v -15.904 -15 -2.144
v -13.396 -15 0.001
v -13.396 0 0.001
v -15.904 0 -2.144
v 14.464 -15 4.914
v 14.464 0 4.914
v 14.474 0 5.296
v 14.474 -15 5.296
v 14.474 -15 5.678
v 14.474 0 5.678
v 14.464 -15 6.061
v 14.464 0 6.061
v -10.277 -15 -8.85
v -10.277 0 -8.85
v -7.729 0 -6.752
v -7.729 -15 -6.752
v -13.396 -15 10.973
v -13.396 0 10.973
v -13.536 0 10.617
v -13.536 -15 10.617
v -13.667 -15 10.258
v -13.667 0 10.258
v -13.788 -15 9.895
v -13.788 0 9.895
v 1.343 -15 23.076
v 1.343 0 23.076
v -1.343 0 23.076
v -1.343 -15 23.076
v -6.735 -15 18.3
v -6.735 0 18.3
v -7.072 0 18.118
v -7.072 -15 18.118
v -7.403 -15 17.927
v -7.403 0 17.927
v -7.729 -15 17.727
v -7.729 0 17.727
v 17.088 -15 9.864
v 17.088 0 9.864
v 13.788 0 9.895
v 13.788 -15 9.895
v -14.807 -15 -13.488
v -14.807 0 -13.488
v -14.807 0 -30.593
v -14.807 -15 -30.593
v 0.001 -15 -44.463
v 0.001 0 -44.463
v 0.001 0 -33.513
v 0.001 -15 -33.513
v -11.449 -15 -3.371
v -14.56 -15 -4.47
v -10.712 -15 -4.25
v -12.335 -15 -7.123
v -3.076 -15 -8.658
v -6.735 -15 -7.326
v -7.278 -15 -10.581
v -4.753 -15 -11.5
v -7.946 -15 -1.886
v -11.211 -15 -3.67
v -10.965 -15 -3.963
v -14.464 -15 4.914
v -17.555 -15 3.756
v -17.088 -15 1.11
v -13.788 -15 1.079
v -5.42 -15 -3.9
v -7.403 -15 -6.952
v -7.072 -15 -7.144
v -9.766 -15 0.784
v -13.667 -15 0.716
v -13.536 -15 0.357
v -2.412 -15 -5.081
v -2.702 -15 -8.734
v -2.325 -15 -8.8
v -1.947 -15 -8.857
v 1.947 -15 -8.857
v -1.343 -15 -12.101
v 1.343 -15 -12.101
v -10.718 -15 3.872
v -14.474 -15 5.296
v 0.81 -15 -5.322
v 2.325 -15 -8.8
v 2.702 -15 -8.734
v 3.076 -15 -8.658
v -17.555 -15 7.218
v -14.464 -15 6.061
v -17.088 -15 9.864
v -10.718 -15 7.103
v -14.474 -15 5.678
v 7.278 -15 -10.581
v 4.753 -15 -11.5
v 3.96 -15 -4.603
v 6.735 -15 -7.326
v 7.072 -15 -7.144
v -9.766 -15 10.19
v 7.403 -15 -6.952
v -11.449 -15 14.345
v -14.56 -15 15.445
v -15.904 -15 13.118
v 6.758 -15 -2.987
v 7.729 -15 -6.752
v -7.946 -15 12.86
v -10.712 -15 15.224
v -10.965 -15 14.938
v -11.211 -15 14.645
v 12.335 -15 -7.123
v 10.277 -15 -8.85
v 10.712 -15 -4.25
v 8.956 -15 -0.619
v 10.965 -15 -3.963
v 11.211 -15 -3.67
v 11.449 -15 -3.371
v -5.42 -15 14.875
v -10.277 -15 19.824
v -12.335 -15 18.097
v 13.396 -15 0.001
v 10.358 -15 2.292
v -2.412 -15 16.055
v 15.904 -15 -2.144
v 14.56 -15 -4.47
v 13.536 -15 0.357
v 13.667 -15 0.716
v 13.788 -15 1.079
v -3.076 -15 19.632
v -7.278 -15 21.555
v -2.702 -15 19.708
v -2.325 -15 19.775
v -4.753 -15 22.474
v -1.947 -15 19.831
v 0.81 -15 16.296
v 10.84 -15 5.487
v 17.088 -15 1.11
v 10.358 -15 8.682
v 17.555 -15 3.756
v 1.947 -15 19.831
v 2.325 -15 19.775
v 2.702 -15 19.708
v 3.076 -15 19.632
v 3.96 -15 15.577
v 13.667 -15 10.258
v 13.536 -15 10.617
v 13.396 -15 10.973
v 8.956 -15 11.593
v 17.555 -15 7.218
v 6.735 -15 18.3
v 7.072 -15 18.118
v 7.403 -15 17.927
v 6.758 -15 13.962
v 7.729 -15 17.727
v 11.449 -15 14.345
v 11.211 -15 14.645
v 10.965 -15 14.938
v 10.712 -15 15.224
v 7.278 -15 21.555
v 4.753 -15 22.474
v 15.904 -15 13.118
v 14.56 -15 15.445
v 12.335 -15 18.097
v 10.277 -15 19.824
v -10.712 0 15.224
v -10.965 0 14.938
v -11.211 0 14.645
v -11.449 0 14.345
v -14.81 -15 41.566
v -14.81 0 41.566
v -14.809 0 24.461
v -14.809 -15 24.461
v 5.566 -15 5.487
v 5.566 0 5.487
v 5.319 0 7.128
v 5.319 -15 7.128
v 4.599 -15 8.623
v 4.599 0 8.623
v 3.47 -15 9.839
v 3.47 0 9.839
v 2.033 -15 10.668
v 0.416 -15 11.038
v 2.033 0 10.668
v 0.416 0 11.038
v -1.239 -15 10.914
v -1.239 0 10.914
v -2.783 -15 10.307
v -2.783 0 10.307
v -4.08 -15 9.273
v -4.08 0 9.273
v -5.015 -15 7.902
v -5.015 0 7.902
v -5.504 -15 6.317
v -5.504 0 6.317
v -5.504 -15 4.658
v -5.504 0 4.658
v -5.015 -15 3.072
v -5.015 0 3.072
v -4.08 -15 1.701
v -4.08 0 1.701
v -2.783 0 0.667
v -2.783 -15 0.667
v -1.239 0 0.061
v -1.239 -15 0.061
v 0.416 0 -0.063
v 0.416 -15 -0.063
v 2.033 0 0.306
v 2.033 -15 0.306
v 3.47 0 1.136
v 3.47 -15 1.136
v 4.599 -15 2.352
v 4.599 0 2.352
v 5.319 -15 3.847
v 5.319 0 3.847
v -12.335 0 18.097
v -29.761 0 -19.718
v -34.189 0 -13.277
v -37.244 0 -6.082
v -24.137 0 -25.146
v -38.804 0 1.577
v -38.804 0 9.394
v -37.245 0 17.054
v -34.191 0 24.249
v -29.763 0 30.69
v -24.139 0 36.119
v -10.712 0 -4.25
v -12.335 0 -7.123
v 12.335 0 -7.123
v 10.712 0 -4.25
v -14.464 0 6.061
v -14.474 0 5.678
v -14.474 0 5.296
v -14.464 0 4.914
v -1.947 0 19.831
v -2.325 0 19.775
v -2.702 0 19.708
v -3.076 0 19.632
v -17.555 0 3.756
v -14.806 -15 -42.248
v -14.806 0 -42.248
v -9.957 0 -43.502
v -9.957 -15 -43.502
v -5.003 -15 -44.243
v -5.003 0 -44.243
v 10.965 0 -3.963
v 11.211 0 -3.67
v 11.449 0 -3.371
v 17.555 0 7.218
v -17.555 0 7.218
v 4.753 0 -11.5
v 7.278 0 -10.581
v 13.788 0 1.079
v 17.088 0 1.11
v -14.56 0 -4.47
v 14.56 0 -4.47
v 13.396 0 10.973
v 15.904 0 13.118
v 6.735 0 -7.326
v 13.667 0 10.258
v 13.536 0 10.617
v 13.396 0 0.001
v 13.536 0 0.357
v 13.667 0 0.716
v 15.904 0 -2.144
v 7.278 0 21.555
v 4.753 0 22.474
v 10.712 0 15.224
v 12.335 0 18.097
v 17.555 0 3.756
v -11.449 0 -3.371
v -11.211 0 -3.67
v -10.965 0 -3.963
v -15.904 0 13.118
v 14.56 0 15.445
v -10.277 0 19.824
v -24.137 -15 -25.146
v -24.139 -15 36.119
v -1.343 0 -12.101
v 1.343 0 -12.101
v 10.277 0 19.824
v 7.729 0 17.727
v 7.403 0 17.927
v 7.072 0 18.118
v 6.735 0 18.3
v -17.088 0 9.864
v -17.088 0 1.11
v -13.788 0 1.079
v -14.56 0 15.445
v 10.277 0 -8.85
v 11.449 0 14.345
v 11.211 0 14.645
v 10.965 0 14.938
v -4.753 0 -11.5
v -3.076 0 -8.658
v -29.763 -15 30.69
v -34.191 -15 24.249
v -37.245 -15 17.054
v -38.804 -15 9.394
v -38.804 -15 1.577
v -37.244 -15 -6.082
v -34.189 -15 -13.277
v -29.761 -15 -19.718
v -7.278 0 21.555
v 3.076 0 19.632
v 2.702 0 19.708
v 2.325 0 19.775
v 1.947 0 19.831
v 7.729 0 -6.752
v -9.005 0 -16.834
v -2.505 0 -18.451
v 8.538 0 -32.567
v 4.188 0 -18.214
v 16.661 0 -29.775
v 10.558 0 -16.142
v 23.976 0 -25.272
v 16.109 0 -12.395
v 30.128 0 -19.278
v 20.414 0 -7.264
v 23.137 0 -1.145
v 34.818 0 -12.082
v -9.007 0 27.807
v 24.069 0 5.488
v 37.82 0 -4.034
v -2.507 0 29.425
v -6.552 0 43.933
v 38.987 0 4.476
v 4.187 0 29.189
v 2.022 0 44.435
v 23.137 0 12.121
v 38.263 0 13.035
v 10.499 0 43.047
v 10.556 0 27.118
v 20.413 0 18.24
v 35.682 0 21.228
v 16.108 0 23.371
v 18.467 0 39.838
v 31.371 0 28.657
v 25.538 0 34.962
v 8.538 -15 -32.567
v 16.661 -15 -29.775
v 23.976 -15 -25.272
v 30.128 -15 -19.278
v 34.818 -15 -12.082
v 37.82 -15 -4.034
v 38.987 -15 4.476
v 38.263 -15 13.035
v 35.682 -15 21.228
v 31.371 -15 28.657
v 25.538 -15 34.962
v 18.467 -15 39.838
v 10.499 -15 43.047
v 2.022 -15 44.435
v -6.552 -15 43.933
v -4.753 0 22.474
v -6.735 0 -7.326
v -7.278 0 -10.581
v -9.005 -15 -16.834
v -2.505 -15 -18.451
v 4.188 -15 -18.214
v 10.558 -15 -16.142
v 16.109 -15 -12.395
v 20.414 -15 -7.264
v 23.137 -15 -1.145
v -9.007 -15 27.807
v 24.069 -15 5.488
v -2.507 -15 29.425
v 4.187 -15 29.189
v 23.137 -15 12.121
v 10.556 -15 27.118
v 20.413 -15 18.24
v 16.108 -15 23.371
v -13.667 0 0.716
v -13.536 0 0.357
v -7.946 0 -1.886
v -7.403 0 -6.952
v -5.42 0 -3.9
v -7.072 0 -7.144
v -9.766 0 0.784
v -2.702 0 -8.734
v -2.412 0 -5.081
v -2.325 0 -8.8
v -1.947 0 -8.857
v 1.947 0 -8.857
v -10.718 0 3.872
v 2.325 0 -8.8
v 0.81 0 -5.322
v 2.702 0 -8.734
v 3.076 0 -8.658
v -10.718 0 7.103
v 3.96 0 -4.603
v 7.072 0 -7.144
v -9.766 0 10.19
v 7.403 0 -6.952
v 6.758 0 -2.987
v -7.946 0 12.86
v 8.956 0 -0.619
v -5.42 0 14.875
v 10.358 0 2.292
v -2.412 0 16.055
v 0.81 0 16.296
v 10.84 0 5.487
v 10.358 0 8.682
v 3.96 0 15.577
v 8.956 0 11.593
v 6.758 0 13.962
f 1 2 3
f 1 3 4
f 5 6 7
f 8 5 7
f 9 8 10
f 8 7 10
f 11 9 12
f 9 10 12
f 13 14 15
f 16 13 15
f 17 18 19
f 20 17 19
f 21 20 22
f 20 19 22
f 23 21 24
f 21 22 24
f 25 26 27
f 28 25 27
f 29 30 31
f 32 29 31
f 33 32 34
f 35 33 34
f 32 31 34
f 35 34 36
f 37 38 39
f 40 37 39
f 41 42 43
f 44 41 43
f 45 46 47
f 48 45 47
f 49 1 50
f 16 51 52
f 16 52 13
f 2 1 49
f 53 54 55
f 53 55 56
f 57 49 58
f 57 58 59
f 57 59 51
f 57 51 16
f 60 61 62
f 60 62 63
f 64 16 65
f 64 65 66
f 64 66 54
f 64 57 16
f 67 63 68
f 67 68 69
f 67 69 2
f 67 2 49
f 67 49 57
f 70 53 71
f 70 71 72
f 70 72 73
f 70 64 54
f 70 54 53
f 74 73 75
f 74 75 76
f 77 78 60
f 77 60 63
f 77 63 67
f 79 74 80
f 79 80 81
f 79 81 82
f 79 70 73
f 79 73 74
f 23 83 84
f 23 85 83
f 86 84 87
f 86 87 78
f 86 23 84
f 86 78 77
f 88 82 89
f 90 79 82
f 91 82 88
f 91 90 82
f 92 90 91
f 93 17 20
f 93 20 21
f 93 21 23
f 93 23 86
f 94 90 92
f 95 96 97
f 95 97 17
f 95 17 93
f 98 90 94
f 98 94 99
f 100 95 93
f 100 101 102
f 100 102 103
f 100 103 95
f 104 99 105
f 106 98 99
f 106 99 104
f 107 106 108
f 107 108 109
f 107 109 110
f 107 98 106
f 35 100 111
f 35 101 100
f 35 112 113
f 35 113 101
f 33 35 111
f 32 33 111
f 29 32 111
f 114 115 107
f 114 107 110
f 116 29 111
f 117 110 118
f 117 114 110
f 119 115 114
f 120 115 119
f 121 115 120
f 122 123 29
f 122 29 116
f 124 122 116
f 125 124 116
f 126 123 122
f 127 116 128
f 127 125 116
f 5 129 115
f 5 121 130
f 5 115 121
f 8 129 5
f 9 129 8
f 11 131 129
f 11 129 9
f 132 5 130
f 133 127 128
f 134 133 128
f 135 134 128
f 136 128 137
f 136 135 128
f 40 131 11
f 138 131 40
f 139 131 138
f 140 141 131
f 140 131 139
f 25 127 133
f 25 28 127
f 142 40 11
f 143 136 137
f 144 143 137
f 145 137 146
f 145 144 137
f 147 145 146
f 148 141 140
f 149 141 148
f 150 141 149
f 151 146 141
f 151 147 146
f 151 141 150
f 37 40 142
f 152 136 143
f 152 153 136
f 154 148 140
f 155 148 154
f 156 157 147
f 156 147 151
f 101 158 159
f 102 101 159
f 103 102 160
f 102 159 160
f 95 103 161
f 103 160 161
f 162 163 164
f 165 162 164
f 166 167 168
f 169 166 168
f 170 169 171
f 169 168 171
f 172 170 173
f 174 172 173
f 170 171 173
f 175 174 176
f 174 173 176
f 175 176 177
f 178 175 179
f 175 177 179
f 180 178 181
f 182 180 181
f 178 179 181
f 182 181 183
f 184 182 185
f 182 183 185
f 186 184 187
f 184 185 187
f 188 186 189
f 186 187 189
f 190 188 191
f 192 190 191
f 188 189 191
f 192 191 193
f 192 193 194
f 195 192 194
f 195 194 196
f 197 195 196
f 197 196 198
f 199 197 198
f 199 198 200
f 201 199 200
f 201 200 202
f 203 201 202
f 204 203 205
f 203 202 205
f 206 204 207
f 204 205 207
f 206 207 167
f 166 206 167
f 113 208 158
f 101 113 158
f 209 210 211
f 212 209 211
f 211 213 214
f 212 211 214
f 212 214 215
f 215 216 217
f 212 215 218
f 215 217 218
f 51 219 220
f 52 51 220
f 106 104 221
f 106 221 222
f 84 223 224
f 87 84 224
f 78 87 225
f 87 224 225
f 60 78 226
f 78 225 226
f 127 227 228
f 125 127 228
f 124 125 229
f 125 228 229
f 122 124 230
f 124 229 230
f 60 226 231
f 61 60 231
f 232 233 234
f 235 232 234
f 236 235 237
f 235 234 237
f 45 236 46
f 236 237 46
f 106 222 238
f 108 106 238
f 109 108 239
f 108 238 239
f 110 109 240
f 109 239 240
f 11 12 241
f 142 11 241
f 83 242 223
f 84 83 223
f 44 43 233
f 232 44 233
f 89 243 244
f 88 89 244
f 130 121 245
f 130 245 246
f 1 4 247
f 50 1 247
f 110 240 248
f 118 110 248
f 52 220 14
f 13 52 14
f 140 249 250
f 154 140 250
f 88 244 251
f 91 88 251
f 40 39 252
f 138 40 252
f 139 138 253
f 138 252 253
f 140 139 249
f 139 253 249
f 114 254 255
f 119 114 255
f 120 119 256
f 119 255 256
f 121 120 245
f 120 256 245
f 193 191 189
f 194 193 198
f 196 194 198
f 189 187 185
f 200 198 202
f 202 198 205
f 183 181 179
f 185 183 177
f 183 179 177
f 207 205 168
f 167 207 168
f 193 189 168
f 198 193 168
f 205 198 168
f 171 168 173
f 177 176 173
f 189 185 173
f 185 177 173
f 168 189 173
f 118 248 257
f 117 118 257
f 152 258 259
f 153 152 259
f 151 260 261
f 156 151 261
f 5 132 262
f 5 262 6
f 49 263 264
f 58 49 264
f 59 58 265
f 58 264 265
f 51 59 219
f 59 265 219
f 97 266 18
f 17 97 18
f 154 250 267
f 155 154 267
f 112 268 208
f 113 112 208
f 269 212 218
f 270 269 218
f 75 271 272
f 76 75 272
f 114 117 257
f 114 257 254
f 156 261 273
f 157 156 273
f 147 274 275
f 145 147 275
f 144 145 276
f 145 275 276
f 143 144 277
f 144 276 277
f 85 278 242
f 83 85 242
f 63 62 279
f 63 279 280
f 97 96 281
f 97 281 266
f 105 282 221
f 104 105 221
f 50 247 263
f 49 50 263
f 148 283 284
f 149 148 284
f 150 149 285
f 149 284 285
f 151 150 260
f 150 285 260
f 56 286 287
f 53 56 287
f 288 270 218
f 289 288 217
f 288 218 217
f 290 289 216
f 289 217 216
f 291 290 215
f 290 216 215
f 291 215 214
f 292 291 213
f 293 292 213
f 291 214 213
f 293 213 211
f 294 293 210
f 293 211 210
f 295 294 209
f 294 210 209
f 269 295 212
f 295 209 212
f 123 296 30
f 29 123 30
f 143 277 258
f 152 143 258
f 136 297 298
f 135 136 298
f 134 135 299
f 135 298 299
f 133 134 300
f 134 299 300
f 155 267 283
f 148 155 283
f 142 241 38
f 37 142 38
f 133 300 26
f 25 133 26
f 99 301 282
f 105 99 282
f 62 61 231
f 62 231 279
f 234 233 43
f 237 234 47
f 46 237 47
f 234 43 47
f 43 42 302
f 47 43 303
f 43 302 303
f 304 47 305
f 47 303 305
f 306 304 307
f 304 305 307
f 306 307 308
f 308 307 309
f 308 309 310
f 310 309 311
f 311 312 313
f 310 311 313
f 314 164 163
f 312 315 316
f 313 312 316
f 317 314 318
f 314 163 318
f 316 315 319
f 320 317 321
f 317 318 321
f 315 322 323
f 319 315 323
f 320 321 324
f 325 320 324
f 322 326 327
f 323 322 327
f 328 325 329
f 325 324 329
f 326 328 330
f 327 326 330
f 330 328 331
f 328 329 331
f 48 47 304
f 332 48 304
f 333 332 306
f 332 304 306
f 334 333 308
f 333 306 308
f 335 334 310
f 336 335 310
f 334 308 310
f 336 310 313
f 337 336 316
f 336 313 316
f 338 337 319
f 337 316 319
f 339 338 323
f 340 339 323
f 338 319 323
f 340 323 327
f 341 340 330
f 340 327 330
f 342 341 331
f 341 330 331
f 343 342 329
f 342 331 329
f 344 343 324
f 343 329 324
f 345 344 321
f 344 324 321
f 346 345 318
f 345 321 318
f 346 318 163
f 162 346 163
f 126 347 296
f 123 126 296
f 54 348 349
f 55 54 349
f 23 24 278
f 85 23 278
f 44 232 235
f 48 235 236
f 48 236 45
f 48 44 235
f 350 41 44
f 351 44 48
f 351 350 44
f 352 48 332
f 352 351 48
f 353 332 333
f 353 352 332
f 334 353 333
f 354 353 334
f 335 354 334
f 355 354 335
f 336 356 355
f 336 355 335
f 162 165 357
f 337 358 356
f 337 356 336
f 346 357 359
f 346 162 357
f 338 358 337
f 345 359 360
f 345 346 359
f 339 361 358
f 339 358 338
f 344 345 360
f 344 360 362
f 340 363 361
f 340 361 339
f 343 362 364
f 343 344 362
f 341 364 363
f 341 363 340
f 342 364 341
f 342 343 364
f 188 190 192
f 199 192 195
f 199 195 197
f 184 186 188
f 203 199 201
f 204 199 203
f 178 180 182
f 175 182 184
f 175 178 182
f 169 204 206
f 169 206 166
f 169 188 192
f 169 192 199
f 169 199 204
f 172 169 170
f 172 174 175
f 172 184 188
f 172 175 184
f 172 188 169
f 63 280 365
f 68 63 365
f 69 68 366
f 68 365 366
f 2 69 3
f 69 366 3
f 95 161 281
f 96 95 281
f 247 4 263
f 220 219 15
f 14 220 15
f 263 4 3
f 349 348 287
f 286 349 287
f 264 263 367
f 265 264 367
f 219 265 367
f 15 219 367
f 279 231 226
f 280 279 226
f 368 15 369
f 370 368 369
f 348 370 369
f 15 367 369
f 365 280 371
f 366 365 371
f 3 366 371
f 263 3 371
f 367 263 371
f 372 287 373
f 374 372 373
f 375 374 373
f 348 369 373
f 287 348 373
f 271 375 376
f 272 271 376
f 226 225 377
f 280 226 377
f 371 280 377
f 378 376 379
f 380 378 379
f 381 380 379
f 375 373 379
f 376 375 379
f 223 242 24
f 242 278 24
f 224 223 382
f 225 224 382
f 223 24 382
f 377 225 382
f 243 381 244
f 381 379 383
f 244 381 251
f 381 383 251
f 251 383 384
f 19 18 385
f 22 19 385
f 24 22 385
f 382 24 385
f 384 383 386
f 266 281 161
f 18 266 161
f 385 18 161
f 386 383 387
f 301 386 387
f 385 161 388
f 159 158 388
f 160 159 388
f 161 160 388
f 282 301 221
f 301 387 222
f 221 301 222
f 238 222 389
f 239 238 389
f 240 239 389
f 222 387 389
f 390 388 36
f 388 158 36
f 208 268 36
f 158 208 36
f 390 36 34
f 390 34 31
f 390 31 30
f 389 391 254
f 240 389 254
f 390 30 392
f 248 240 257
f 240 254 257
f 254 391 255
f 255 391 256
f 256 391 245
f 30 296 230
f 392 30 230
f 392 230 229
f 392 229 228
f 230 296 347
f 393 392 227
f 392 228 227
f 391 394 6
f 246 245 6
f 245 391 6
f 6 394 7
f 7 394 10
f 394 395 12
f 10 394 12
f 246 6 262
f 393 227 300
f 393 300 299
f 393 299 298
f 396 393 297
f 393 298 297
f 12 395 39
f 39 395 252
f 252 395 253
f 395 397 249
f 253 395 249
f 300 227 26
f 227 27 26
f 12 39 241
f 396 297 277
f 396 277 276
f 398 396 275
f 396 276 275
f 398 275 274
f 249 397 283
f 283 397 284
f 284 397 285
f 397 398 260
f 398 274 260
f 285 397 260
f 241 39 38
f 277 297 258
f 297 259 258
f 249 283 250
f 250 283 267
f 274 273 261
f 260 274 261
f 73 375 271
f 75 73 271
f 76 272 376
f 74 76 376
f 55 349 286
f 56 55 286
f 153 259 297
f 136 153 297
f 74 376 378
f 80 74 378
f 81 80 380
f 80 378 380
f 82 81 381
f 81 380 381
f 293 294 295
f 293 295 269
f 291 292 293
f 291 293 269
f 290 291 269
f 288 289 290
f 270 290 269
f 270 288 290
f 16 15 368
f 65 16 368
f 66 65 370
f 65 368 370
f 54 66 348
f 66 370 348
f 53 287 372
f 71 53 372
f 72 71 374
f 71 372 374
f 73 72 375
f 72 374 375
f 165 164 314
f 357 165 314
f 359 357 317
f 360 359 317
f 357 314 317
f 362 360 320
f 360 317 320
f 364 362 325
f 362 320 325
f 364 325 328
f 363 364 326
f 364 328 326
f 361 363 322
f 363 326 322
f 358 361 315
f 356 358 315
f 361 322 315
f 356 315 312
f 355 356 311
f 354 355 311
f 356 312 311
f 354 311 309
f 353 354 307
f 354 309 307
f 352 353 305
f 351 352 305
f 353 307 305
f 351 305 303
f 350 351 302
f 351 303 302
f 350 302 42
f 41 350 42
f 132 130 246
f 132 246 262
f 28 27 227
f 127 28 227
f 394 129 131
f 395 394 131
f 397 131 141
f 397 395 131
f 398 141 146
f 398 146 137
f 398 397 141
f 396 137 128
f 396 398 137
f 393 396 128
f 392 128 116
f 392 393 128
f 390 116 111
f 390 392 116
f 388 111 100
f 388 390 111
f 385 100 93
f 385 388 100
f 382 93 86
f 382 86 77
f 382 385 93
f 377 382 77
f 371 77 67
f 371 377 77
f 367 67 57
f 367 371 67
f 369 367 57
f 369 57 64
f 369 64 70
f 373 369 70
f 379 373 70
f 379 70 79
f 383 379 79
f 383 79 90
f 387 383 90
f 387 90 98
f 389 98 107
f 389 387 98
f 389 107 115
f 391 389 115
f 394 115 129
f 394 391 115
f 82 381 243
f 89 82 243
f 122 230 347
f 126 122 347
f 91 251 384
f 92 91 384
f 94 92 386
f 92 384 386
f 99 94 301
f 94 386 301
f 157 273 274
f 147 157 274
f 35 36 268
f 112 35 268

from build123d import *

# Parameters (mm, degrees)
F0_R     = 10.83954
F0_R_2   = 5.565876
F1_DEPTH = 15
F2_DEPTH = 15


with BuildPart() as f1:
    # F0 (on Front) → F1 (new body)
    with BuildSketch(Plane.XZ):
        with BuildLine():
            Line((-17.554518, 7.21844), (-14.464271, 6.060695))
            ThreePointArc((-14.464271, 6.060695), (-14.475635, 5.48722), (-14.464271, 4.913746))
            Line((-14.464271, 4.913746), (-17.554518, 3.756001))
            Line((-17.554518, 3.756001), (-17.087963, 1.110036))
            Line((-17.087963, 1.110036), (-13.788108, 1.079038))
            ThreePointArc((-13.788108, 1.079038), (-13.602647, 0.536262), (-13.395829, 0.001259))
            Line((-13.395829, 0.001259), (-15.903739, -2.143593))
            Line((-15.903739, -2.143593), (-14.560347, -4.470415))
            Line((-14.560347, -4.470415), (-11.448897, -3.370927))
            ThreePointArc((-11.448897, -3.370927), (-11.08898, -3.817538), (-10.711652, -4.249541))
            Line((-10.711652, -4.249541), (-12.334734, -7.122797))
            Line((-12.334734, -7.122797), (-10.276539, -8.849828))
            Line((-10.276539, -8.849828), (-7.728779, -6.752468))
            ThreePointArc((-7.728779, -6.752468), (-7.237817, -7.049047), (-6.735492, -7.325943))
            Line((-6.735492, -7.325943), (-7.277979, -10.581048))
            Line((-7.277979, -10.581048), (-4.753228, -11.499982))
            Line((-4.753228, -11.499982), (-3.076457, -8.657723))
            ThreePointArc((-3.076457, -8.657723), (-2.513668, -8.768497), (-1.946932, -8.856889))
            Line((-1.946932, -8.856889), (-1.343392, -12.101228))
            Line((-1.343392, -12.101228), (1.343392, -12.101228))
            Line((1.343392, -12.101228), (1.946932, -8.856889))
            ThreePointArc((1.946932, -8.856889), (2.513668, -8.768497), (3.076457, -8.657723))
            Line((3.076457, -8.657723), (4.753228, -11.499982))
            Line((4.753228, -11.499982), (7.277979, -10.581048))
            Line((7.277979, -10.581048), (6.735492, -7.325943))
            ThreePointArc((6.735492, -7.325943), (7.237817, -7.049047), (7.728779, -6.752468))
            Line((7.728779, -6.752468), (10.276539, -8.849828))
            Line((10.276539, -8.849828), (12.334734, -7.122797))
            Line((12.334734, -7.122797), (10.711652, -4.249541))
            ThreePointArc((10.711652, -4.249541), (11.08898, -3.817538), (11.448897, -3.370927))
            Line((11.448897, -3.370927), (14.560347, -4.470415))
            Line((14.560347, -4.470415), (15.903739, -2.143593))
            Line((15.903739, -2.143593), (13.395829, 0.001259))
            ThreePointArc((13.395829, 0.001259), (13.602647, 0.536262), (13.788108, 1.079038))
            Line((13.788108, 1.079038), (17.087963, 1.110036))
            Line((17.087963, 1.110036), (17.554518, 3.756001))
            Line((17.554518, 3.756001), (14.464271, 4.913746))
            ThreePointArc((14.464271, 4.913746), (14.475635, 5.48722), (14.464271, 6.060695))
            Line((14.464271, 6.060695), (17.554518, 7.21844))
            Line((17.554518, 7.21844), (17.087963, 9.864405))
            Line((17.087963, 9.864405), (13.788108, 9.895402))
            ThreePointArc((13.788108, 9.895402), (13.602647, 10.438179), (13.395829, 10.973182))
            Line((13.395829, 10.973182), (15.903739, 13.118033))
            Line((15.903739, 13.118033), (14.560347, 15.444856))
            Line((14.560347, 15.444856), (11.448897, 14.345367))
            ThreePointArc((11.448897, 14.345367), (11.08898, 14.791979), (10.711652, 15.223982))
            Line((10.711652, 15.223982), (12.334734, 18.097238))
            Line((12.334734, 18.097238), (10.276539, 19.824269))
            Line((10.276539, 19.824269), (7.728779, 17.726909))
            ThreePointArc((7.728779, 17.726909), (7.237817, 18.023488), (6.735492, 18.300384))
            Line((6.735492, 18.300384), (7.277979, 21.555489))
            Line((7.277979, 21.555489), (4.753228, 22.474423))
            Line((4.753228, 22.474423), (3.076457, 19.632164))
            ThreePointArc((3.076457, 19.632164), (2.513668, 19.742938), (1.946932, 19.831329))
            Line((1.946932, 19.831329), (1.343392, 23.075669))
            Line((1.343392, 23.075669), (-1.343392, 23.075669))
            Line((-1.343392, 23.075669), (-1.946932, 19.831329))
            ThreePointArc((-1.946932, 19.831329), (-2.513668, 19.742938), (-3.076457, 19.632164))
            Line((-3.076457, 19.632164), (-4.753228, 22.474423))
            Line((-4.753228, 22.474423), (-7.277979, 21.555489))
            Line((-7.277979, 21.555489), (-6.735492, 18.300384))
            ThreePointArc((-6.735492, 18.300384), (-7.237817, 18.023488), (-7.728779, 17.726909))
            Line((-7.728779, 17.726909), (-10.276539, 19.824269))
            Line((-10.276539, 19.824269), (-12.334734, 18.097238))
            Line((-12.334734, 18.097238), (-10.711652, 15.223982))
            ThreePointArc((-10.711652, 15.223982), (-11.08898, 14.791979), (-11.448897, 14.345367))
            Line((-11.448897, 14.345367), (-14.560347, 15.444856))
            Line((-14.560347, 15.444856), (-15.903739, 13.118033))
            Line((-15.903739, 13.118033), (-13.395829, 10.973182))
            ThreePointArc((-13.395829, 10.973182), (-13.602647, 10.438179), (-13.788108, 9.895402))
            Line((-13.788108, 9.895402), (-17.087963, 9.864405))
            Line((-17.087963, 9.864405), (-17.554518, 7.21844))
        make_face()
        with Locations((0, 5.48722)):
            Circle(F0_R, mode=Mode.SUBTRACT)
        with Locations((0, 5.48722)):
            Circle(F0_R_2)
    extrude(amount=F1_DEPTH)


with BuildPart() as f2:
    # F0 (on Front) → F2 (new body)
    with BuildSketch(Plane.XZ):
        with BuildLine():
            ThreePointArc((-14.808813, 24.46105), (24.0688, 5.48819), (-14.807285, -13.487802))
            Line((-14.807285, -13.487802), (-14.806596, -30.592756))
            Line((-14.806596, -30.592756), (-14.806126, -42.247675))
            ThreePointArc((-14.806126, -42.247675), (-7.489839, -43.937437), (0.00064, -44.462856))
            Line((0.00064, -44.462856), (0.00064, -33.51278))
            ThreePointArc((0.00064, -33.51278), (38.262665, 13.034965), (-14.809502, 41.566004))
            Line((-14.809502, 41.566004), (-14.808813, 24.46105))
        make_face()
        with BuildLine():
            Line((-24.136815, -25.146326), (-24.139283, 36.118822))
            ThreePointArc((-24.139283, 36.118822), (-39, 5.485649), (-24.136815, -25.146326))
        make_face()
    extrude(amount=F2_DEPTH)


solid = Compound([f1.part, f2.part])
